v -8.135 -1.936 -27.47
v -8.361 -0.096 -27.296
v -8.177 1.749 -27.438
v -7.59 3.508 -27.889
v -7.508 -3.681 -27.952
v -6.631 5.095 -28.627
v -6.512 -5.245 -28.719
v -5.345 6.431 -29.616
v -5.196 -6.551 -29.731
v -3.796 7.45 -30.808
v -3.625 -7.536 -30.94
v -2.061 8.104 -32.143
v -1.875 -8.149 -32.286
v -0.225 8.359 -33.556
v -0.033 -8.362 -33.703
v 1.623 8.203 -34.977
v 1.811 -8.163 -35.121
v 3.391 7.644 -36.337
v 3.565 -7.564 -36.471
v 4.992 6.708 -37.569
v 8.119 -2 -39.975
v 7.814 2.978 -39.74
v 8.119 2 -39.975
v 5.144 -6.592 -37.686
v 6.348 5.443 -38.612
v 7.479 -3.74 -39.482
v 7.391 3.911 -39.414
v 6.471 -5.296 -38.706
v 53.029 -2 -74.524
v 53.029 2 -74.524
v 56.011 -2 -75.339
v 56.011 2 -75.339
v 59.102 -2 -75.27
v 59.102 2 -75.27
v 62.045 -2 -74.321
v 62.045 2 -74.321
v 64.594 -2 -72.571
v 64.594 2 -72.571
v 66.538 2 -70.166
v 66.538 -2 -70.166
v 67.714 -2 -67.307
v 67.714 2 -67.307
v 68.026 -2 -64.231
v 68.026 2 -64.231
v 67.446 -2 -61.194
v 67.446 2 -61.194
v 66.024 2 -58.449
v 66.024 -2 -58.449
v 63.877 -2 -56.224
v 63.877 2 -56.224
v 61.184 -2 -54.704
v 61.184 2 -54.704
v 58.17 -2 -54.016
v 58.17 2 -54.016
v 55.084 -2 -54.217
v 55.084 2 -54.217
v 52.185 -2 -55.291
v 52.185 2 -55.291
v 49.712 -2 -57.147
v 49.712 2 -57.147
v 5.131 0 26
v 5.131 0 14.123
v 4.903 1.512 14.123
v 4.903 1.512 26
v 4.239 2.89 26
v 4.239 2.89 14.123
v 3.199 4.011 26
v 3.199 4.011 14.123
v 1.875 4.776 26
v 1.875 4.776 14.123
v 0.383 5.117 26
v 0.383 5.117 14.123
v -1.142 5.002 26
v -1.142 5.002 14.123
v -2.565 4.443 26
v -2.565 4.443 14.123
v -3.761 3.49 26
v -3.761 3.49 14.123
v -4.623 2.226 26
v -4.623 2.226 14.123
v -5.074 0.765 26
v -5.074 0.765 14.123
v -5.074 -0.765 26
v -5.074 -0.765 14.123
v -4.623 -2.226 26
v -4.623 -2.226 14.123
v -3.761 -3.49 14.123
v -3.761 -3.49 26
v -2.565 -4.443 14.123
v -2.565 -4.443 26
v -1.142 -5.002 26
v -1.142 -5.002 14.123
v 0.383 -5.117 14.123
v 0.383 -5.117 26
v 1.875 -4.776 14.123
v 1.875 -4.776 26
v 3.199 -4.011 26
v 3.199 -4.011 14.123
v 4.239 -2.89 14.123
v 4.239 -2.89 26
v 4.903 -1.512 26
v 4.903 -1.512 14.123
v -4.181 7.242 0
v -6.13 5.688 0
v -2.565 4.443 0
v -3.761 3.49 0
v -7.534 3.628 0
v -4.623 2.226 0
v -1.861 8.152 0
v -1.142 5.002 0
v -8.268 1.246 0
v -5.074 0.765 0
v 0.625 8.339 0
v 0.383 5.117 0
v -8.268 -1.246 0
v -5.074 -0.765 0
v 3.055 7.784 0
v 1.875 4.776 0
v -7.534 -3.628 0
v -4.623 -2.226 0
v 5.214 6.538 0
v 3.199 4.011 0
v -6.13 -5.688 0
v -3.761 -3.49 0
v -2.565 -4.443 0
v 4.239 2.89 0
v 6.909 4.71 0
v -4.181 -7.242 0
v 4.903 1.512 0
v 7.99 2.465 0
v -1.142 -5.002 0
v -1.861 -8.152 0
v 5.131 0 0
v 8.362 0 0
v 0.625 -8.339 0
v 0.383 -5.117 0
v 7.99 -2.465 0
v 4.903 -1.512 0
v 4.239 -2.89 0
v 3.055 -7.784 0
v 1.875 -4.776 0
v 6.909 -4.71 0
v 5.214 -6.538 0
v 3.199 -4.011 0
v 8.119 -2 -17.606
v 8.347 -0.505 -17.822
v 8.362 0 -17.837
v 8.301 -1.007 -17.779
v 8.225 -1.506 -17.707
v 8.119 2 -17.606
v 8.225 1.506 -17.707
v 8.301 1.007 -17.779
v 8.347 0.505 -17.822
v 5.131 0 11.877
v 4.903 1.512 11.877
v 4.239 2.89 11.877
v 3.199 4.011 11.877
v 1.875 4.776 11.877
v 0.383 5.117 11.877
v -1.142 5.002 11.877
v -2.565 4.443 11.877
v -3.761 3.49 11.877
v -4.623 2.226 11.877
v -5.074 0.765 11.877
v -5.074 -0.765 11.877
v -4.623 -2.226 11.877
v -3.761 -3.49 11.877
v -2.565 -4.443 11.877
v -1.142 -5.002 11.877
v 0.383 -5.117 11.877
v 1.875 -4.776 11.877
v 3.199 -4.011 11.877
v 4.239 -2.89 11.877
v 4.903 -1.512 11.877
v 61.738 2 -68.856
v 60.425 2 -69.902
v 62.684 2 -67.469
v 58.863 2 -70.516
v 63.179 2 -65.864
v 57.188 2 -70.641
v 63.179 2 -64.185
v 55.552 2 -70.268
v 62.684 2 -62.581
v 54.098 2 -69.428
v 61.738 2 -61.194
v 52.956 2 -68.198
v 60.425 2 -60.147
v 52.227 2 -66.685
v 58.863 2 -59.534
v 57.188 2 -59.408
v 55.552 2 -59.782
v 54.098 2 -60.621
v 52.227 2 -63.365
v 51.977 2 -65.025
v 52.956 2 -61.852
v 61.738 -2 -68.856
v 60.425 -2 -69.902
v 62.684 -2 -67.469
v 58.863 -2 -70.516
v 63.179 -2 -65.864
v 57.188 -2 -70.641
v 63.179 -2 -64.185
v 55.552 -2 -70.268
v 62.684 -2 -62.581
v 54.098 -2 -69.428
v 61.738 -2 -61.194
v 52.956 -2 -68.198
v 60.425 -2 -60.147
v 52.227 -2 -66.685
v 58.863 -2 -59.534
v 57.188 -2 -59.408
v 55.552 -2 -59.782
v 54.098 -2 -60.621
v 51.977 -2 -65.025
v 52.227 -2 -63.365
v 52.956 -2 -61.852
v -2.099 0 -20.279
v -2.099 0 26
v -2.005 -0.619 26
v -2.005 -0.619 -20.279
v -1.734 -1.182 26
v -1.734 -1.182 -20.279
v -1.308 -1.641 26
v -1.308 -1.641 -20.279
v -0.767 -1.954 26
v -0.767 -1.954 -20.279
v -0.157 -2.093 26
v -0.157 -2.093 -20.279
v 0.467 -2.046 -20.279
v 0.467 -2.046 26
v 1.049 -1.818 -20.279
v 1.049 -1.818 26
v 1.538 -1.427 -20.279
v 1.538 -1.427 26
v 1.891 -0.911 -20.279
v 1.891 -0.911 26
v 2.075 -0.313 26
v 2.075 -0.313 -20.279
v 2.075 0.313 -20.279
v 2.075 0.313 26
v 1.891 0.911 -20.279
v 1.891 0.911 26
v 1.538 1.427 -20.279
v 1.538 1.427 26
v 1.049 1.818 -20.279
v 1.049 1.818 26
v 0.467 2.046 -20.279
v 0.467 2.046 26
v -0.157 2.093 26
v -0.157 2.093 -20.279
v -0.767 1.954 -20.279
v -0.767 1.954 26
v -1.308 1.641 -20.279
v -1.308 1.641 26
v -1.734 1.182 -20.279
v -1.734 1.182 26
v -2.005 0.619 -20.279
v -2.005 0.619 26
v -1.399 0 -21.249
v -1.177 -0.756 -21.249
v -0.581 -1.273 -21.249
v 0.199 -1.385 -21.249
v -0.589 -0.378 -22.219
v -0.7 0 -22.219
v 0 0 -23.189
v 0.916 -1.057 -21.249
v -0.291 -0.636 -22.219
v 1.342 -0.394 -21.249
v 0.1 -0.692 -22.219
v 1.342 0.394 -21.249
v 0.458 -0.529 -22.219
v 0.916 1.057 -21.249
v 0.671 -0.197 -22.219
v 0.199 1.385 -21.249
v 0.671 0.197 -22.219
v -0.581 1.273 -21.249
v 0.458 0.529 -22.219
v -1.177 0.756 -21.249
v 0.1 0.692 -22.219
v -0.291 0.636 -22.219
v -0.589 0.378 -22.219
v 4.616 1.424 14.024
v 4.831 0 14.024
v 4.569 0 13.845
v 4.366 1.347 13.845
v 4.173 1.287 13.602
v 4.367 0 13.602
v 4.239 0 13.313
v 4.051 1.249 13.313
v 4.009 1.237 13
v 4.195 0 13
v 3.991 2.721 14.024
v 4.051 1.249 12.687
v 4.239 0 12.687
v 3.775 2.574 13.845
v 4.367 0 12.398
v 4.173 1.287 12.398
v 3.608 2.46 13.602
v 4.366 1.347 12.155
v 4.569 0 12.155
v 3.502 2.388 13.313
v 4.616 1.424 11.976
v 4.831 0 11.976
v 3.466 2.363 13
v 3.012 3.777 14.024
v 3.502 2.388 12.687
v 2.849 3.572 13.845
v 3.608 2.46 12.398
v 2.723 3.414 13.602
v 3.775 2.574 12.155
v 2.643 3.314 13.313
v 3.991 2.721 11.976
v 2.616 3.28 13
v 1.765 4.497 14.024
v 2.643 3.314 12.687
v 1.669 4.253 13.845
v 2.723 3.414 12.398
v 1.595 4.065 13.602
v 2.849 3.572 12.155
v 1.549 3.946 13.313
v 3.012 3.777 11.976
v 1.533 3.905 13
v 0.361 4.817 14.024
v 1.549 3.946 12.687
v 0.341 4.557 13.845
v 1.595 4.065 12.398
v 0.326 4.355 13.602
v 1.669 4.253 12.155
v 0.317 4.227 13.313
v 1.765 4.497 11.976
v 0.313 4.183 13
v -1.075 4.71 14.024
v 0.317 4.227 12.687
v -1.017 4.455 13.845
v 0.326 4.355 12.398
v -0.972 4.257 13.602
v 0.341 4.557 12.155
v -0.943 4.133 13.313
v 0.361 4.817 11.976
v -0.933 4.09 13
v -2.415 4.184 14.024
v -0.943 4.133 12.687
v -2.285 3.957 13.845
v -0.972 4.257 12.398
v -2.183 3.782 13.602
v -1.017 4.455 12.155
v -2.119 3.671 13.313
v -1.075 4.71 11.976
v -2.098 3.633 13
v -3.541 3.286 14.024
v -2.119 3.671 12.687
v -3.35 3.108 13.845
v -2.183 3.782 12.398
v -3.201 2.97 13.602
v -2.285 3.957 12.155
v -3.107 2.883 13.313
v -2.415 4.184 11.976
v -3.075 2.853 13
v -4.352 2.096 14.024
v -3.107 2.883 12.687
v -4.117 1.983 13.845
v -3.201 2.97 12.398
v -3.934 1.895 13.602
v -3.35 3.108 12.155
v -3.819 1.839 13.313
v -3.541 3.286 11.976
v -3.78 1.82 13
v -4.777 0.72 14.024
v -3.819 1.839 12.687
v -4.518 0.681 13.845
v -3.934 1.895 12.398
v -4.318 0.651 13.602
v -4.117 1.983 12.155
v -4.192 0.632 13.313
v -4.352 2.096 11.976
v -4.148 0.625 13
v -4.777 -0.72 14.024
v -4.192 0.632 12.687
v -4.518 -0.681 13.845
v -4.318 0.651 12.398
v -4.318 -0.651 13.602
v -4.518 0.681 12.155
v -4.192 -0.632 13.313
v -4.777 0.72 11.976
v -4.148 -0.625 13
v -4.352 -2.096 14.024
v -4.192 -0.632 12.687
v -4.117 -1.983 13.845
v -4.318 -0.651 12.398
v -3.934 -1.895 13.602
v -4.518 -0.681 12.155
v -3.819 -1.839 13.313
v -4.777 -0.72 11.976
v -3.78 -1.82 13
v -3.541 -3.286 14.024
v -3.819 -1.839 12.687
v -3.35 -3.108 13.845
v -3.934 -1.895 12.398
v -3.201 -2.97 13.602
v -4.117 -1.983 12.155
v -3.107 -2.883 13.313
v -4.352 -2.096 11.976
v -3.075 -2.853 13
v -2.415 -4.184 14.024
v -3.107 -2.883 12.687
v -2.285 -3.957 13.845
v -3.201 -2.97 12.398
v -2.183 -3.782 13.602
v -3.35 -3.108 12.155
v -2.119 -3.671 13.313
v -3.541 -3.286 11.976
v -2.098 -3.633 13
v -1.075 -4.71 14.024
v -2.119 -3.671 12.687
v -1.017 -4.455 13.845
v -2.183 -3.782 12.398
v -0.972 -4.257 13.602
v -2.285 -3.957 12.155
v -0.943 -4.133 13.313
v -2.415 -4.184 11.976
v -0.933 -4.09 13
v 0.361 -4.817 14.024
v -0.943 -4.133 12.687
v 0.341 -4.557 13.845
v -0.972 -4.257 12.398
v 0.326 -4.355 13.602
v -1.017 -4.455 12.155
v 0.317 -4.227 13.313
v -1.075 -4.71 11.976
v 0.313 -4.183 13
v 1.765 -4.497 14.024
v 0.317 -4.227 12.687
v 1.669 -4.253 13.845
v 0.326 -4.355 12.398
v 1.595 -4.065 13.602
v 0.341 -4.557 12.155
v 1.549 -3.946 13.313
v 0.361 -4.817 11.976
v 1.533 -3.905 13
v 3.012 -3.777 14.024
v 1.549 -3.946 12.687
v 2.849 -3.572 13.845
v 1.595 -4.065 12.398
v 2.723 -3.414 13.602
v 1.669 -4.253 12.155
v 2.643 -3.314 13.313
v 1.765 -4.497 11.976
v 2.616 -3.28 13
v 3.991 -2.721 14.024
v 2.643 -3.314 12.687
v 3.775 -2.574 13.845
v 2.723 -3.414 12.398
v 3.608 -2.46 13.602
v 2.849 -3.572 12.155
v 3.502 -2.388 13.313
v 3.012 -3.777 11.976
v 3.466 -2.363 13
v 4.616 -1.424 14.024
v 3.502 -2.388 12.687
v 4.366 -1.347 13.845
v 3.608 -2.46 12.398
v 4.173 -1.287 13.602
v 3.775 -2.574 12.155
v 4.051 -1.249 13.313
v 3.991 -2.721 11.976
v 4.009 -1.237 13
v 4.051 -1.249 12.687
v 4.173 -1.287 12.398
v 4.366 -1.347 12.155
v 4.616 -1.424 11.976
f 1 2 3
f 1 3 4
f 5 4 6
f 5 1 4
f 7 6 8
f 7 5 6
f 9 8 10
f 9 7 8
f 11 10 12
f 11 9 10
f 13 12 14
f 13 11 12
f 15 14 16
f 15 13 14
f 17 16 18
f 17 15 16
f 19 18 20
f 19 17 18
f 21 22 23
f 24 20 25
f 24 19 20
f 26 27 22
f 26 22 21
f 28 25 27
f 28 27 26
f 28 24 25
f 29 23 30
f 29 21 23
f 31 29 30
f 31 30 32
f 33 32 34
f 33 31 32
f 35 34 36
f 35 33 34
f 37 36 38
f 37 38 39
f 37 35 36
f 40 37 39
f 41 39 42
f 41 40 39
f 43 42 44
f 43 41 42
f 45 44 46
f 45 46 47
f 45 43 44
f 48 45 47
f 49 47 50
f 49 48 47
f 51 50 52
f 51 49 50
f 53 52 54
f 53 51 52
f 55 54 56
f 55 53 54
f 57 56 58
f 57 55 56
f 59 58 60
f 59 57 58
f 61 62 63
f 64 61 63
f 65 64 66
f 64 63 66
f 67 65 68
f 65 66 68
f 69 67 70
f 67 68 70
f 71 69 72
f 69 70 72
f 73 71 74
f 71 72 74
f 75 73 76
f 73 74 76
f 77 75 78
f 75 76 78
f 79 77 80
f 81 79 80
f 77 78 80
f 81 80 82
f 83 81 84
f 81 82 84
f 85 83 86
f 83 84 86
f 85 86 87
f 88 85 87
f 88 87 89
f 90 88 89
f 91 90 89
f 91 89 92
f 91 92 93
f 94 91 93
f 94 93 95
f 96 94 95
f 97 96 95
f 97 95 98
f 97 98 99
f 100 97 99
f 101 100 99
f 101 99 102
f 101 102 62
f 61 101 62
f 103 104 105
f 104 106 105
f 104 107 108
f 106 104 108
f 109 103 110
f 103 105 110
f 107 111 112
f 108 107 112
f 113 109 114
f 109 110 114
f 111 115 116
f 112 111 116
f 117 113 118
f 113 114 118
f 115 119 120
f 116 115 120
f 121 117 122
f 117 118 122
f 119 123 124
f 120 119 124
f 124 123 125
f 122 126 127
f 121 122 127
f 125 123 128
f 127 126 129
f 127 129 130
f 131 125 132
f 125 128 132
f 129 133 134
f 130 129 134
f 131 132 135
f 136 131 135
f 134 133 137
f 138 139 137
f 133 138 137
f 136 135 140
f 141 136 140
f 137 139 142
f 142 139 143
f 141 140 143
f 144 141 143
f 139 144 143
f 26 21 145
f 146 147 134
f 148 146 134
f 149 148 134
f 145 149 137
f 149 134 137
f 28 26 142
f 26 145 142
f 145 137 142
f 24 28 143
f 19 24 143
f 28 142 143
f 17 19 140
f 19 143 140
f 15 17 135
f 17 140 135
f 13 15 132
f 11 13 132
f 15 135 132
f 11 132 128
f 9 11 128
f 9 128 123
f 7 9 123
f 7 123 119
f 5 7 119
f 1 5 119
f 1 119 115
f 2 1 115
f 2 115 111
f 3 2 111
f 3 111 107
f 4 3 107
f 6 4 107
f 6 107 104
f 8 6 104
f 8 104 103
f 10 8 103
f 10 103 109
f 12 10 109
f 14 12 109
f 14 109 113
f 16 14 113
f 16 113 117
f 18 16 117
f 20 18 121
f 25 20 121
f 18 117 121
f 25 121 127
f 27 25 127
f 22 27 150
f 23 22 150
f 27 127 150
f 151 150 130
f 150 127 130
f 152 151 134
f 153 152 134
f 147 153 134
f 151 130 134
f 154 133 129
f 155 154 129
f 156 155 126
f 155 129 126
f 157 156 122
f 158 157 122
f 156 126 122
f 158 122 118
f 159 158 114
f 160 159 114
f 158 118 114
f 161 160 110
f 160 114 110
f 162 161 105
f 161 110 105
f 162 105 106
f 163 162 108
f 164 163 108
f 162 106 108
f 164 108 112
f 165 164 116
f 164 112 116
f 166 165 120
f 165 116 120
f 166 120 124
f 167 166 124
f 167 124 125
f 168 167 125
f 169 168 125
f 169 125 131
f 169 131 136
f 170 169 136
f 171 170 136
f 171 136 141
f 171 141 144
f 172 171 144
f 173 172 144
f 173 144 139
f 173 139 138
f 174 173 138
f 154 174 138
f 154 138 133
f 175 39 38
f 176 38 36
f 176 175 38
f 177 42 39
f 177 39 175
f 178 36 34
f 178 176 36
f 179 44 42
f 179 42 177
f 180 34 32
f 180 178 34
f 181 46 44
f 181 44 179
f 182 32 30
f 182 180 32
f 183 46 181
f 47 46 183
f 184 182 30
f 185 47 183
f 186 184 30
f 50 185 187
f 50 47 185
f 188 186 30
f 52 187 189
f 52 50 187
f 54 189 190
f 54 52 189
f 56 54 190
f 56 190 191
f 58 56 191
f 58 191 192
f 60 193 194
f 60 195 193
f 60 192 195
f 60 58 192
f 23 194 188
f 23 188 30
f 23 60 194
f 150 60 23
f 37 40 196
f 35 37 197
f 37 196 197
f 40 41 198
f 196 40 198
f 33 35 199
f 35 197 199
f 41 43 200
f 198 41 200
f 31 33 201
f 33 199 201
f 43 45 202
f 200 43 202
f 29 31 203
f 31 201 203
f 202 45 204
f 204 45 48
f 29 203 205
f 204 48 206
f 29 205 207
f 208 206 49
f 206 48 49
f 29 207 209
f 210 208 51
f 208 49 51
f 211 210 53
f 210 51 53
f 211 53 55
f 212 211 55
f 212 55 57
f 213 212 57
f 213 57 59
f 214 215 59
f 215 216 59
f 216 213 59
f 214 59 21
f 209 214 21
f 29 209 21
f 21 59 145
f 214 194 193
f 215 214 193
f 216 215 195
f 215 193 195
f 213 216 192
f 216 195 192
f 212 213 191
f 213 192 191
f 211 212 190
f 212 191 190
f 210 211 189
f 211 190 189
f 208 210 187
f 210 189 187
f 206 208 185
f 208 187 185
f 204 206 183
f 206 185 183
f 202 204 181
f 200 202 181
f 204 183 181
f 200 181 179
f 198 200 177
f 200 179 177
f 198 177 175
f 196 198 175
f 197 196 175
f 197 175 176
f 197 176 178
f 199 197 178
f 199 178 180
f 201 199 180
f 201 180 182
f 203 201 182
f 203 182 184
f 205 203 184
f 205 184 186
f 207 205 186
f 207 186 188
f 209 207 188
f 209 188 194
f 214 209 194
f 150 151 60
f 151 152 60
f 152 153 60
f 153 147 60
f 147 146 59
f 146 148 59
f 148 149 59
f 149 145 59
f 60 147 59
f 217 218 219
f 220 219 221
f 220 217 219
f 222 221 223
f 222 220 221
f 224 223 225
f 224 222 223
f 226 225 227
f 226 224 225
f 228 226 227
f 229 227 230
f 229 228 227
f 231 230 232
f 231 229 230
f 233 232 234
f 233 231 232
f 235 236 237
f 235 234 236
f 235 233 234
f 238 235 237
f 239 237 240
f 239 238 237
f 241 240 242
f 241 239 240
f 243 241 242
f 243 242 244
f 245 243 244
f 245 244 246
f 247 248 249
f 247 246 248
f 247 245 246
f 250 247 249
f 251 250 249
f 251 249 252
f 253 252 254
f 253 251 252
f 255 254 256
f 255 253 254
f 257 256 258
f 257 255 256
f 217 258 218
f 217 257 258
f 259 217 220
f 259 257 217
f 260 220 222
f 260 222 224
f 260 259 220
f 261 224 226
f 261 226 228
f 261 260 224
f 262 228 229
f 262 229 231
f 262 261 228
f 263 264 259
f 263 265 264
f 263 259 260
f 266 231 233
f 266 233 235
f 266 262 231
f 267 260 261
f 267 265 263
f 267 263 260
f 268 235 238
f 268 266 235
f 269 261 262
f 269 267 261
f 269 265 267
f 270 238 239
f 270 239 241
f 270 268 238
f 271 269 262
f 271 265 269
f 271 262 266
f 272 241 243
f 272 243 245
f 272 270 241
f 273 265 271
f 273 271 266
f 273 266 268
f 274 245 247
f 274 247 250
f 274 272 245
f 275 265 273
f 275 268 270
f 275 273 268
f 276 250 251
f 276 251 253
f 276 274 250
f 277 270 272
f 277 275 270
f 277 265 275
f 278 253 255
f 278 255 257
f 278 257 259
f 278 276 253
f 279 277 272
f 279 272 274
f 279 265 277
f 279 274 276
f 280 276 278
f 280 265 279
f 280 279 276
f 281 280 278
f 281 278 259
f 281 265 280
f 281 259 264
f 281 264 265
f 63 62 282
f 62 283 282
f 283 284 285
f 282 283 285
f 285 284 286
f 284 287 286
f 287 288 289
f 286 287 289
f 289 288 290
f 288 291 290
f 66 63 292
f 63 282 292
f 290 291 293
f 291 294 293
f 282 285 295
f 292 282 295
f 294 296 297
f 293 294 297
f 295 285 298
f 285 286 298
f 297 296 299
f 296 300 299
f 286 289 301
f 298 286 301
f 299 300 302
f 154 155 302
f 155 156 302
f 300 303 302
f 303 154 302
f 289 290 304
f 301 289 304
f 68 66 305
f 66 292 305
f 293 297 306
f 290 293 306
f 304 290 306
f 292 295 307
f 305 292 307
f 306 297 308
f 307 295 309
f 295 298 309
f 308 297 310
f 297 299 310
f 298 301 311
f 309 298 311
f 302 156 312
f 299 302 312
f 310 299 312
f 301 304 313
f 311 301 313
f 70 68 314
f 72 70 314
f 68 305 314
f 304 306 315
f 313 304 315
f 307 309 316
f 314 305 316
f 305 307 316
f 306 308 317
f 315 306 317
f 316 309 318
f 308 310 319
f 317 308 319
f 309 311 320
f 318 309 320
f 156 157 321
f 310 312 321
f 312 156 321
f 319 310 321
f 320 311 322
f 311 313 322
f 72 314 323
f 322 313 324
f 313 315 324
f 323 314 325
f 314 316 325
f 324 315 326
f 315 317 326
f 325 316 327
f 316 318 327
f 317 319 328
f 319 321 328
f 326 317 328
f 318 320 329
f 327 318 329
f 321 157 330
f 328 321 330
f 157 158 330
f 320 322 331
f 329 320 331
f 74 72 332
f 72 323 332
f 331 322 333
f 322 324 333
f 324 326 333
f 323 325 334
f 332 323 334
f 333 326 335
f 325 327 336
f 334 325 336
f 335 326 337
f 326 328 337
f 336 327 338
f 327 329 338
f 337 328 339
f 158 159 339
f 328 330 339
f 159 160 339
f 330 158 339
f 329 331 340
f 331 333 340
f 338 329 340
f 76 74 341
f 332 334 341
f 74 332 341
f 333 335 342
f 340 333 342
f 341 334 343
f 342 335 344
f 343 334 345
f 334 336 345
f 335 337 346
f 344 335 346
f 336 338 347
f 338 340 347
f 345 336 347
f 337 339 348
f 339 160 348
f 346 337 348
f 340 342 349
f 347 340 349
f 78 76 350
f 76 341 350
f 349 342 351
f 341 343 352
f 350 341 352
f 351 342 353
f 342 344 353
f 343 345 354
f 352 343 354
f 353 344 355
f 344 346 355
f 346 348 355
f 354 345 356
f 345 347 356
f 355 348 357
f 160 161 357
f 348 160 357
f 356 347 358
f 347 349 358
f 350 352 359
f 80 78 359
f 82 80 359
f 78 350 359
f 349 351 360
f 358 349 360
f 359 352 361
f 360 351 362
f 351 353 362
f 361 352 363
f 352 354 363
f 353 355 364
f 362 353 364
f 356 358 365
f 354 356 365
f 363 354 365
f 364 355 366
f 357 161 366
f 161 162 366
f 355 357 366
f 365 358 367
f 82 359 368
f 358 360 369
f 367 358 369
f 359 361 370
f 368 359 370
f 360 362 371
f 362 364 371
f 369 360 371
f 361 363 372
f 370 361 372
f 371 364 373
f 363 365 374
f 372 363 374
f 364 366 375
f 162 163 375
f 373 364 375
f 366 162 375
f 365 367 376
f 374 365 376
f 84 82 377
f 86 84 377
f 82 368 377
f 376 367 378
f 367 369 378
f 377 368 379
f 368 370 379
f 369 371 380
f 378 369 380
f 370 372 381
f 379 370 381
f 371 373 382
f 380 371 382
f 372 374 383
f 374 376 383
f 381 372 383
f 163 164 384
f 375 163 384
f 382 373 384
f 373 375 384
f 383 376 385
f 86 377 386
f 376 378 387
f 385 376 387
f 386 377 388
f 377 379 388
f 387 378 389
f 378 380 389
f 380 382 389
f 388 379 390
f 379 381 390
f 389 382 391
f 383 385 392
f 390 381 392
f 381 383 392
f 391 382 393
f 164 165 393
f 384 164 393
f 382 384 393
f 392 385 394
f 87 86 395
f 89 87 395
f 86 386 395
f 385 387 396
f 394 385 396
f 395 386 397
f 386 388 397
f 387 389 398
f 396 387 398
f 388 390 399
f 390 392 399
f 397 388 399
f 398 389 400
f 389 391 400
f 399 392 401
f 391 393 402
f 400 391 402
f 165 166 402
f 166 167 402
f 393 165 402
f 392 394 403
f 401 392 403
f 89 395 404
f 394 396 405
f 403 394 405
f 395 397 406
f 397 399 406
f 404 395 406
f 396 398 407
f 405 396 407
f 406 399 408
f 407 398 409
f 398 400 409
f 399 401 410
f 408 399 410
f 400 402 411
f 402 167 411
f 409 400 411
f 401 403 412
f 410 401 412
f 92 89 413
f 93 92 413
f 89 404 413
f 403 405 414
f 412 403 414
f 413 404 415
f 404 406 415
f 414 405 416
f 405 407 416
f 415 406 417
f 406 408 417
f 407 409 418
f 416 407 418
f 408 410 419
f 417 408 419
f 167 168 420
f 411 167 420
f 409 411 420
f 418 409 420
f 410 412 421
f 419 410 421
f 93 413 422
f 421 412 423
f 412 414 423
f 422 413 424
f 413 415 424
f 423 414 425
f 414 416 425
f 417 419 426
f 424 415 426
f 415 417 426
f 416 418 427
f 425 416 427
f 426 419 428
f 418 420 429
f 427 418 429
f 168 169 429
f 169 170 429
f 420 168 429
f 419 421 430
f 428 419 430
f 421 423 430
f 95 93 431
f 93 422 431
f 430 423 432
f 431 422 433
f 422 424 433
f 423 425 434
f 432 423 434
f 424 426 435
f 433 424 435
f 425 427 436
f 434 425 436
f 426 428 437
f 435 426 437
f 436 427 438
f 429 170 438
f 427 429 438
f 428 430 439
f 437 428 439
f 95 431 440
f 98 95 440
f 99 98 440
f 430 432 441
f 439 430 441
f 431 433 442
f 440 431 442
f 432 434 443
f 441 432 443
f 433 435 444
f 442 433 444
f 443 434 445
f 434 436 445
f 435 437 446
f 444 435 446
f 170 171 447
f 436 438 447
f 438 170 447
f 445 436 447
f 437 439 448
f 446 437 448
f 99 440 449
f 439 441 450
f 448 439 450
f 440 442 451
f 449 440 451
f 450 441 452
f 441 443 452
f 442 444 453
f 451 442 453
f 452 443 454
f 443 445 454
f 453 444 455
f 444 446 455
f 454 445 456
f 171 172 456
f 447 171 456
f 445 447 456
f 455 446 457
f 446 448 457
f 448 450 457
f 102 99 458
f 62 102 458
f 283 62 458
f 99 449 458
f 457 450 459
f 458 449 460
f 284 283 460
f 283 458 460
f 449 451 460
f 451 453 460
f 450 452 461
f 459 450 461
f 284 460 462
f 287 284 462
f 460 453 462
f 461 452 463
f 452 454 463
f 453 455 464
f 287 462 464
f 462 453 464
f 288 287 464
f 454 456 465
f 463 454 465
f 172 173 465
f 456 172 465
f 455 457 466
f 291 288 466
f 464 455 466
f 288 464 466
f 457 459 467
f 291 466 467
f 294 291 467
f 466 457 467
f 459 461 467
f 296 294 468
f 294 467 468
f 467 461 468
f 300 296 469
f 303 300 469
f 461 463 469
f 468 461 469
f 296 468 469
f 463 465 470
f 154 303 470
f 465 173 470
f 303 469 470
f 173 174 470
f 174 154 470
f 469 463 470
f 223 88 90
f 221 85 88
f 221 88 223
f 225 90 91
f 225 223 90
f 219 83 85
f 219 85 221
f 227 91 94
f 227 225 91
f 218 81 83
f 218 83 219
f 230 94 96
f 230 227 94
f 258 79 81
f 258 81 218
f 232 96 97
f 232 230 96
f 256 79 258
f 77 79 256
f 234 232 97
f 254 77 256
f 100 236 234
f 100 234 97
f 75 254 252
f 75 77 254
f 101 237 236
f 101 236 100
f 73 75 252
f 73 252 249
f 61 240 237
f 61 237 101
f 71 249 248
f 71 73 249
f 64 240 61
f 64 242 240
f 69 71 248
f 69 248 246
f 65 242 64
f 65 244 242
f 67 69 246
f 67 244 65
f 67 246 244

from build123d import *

# Parameters (mm, degrees)
SKETCH_R        = 5.130877
PAD_DEPTH       = 26
SKETCH002_R     = 1.142124
SKETCH003_R     = 8.361882
PAD001_DEPTH    = 40
PAD002_DEPTH    = 2
POCKET_DEPTH    = 10.5
SKETCH007_R     = 5.632133
POCKET001_DEPTH = 5


with BuildPart() as part:
    # Sketch → Pad (new body)
    with BuildSketch(Plane.XY):
        Circle(SKETCH_R)
    extrude(amount=PAD_DEPTH)

    # Sketch002 (on DatumPlane) → Groove (revolve, cut)
    with BuildSketch(Plane(origin=(0, 0, 13), x_dir=(1, 0, 0), z_dir=(0, -1, 0))):
        with Locations((5.337208, 0)):
            Circle(SKETCH002_R)
    revolve(axis=Axis((0, 0, 13), (0, 0, 1)), mode=Mode.SUBTRACT)

    # Sketch003 (on Face2 of Groove) → Pad001 (join)
    with BuildSketch(Plane(origin=(0, 0, 0), x_dir=(1, 0, 0), z_dir=(0, 0, -1))):
        Circle(SKETCH003_R)
    extrude(amount=PAD001_DEPTH)

    # Sketch004 (on DatumPlane) → Groove001 (revolve, cut)
    with BuildSketch(Plane(origin=(0, 0, 13), x_dir=(1, 0, 0), z_dir=(0, -1, 0))):
        Polygon((-2.098671, 66.083956), (-2.098671, -33.279097), (0, -36.189228), (0, -33.279097), (0, 66.139438), (0, 66.083956), align=None)
    revolve(axis=Axis((0, 0, 13), (0, 0, 1)), mode=Mode.SUBTRACT)

    # Sketch005 (on DatumPlane) → Pad002 (join, symmetric)
    with BuildSketch(Plane(origin=(0, 0, 13), x_dir=(1, 0, 0), z_dir=(0, -1, 0))):
        with BuildLine():
            Line((7.000219, -29.542121), (49.71245, -70.147492))
            ThreePointArc((50.443017, -85.924472), (68.024657, -77.204934), (49.71245, -70.147492))
            Line((7.000219, -52.373556), (50.443017, -85.924472))
            Line((7.000219, -29.542121), (7.000219, -52.373556))
        make_face()
    extrude(amount=PAD002_DEPTH, both=True)

    # Sketch006 (on DatumPlane) → Pocket (cut, symmetric)
    with BuildSketch(Plane(origin=(0, 0, 13), x_dir=(1, 0, 0), z_dir=(0, -1, 0))):
        Polygon((-10.626366, -38.553432), (62.605824, -94.891693), (-10.165777, -94.891693), align=None)
    extrude(amount=POCKET_DEPTH, both=True, mode=Mode.SUBTRACT)

    # Sketch007 (on Face3 of Pocket) → Pocket001 (cut)
    with BuildSketch(Plane(origin=(0, 2, 0), x_dir=(-1, 0, 0), z_dir=(0, 1, 0))):
        with Locations((-57.609379, -65.024849)):
            Circle(SKETCH007_R)
    extrude(amount=-POCKET001_DEPTH, mode=Mode.SUBTRACT)


solid = part.part
